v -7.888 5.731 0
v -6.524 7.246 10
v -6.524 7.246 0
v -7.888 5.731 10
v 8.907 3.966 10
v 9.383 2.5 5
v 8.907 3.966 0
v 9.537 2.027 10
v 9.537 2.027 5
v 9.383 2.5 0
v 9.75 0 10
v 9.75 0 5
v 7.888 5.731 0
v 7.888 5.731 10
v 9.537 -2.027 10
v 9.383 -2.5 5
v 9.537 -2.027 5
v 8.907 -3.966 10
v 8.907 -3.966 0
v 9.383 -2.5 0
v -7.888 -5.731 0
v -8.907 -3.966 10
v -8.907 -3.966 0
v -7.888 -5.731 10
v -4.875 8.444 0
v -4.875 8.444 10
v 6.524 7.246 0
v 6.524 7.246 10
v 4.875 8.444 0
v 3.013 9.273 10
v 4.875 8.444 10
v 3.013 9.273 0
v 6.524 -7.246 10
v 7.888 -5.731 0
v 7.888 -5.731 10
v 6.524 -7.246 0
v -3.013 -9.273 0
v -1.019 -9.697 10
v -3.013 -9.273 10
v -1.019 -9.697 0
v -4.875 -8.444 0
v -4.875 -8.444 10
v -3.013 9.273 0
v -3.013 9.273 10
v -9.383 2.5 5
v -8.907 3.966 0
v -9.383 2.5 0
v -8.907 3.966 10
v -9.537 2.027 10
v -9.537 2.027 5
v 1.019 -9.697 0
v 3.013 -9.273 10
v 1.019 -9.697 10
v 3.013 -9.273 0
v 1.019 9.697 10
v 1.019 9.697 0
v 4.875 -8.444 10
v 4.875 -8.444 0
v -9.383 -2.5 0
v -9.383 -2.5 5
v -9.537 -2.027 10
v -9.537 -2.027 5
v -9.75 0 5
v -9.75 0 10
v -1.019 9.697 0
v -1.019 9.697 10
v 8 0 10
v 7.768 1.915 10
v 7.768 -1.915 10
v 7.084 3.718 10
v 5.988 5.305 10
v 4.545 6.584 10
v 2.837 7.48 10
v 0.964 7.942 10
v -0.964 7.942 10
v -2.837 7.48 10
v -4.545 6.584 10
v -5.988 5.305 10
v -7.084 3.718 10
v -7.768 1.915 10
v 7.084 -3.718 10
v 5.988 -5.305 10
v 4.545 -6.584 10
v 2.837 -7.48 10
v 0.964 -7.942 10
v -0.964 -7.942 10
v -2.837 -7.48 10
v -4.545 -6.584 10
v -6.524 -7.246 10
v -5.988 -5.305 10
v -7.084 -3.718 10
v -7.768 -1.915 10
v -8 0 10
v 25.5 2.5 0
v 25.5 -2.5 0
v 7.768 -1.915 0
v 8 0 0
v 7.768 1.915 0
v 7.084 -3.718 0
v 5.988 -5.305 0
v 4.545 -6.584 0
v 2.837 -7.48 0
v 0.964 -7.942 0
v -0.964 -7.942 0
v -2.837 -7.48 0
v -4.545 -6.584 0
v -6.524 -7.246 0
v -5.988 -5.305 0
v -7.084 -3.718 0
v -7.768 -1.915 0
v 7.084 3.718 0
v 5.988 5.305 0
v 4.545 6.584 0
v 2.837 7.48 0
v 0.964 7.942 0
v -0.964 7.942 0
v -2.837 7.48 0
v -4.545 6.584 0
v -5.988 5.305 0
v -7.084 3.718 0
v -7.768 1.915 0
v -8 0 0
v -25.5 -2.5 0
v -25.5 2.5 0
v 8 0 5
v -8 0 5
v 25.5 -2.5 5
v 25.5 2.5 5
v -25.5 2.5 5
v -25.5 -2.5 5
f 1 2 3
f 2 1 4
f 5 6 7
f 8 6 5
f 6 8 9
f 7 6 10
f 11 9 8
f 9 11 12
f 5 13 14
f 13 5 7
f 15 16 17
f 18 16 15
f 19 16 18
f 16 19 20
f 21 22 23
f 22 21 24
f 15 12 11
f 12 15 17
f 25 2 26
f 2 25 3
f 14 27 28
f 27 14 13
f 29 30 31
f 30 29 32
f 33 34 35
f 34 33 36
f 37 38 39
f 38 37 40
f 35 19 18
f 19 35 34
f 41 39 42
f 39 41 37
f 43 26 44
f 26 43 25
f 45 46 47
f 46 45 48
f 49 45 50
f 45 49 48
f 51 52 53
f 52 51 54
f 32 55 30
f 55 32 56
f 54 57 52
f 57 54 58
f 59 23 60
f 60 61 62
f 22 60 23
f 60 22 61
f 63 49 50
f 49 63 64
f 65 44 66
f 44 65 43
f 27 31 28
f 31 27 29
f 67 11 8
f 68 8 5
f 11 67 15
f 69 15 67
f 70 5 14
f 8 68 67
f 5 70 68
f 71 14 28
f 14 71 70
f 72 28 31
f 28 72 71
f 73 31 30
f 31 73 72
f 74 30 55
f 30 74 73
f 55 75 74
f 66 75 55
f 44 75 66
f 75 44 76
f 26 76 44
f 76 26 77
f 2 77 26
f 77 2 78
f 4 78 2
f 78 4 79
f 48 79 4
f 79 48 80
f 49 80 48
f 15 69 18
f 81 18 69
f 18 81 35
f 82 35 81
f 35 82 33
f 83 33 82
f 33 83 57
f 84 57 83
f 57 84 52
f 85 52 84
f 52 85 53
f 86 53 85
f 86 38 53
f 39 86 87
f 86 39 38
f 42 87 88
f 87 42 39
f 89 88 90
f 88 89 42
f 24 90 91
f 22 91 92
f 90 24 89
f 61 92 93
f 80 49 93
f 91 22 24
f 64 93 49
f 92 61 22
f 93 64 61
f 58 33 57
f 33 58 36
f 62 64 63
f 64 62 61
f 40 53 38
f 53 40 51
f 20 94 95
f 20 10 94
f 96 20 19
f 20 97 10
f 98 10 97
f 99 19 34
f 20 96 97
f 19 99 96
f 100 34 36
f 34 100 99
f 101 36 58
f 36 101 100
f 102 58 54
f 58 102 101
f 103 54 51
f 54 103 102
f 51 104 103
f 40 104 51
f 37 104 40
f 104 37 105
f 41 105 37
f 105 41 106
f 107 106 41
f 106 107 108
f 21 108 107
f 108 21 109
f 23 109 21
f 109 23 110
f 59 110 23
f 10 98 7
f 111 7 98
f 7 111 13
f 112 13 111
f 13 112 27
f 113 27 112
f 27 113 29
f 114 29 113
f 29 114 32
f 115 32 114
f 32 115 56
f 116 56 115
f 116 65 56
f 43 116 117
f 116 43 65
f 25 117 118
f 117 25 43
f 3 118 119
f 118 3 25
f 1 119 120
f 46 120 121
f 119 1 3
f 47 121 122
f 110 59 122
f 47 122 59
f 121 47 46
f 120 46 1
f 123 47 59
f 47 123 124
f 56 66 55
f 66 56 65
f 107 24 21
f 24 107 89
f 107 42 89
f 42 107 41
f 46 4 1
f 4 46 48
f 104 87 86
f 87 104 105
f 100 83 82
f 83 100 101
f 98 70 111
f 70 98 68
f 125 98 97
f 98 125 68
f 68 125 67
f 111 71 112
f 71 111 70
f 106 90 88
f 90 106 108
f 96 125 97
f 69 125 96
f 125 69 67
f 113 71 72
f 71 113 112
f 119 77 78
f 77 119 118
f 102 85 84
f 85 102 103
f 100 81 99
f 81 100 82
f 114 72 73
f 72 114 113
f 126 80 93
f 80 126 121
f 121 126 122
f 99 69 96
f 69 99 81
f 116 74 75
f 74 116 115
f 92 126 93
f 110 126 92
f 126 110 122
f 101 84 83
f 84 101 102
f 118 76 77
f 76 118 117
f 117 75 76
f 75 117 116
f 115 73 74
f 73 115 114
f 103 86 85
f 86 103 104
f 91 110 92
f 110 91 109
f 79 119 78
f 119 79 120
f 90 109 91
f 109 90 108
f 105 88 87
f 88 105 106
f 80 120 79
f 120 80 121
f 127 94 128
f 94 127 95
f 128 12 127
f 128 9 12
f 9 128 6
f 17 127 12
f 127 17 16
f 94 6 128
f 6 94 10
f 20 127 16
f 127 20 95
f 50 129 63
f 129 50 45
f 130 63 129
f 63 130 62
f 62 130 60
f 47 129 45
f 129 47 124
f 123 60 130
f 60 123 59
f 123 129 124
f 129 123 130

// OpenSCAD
    // Inner ring (5mm to 10mm diameter)
    difference() {
        cylinder(h=10, d=19.5);
        cylinder(h=10, d=16);
    }

    
    // Connecting spokes
    for(i = [0:180:359]) {
        rotate([0,0,i]) {
            translate([8,-2.5,0]) {
                cube([17.5, 5, 5]);
            }
        }
    }
